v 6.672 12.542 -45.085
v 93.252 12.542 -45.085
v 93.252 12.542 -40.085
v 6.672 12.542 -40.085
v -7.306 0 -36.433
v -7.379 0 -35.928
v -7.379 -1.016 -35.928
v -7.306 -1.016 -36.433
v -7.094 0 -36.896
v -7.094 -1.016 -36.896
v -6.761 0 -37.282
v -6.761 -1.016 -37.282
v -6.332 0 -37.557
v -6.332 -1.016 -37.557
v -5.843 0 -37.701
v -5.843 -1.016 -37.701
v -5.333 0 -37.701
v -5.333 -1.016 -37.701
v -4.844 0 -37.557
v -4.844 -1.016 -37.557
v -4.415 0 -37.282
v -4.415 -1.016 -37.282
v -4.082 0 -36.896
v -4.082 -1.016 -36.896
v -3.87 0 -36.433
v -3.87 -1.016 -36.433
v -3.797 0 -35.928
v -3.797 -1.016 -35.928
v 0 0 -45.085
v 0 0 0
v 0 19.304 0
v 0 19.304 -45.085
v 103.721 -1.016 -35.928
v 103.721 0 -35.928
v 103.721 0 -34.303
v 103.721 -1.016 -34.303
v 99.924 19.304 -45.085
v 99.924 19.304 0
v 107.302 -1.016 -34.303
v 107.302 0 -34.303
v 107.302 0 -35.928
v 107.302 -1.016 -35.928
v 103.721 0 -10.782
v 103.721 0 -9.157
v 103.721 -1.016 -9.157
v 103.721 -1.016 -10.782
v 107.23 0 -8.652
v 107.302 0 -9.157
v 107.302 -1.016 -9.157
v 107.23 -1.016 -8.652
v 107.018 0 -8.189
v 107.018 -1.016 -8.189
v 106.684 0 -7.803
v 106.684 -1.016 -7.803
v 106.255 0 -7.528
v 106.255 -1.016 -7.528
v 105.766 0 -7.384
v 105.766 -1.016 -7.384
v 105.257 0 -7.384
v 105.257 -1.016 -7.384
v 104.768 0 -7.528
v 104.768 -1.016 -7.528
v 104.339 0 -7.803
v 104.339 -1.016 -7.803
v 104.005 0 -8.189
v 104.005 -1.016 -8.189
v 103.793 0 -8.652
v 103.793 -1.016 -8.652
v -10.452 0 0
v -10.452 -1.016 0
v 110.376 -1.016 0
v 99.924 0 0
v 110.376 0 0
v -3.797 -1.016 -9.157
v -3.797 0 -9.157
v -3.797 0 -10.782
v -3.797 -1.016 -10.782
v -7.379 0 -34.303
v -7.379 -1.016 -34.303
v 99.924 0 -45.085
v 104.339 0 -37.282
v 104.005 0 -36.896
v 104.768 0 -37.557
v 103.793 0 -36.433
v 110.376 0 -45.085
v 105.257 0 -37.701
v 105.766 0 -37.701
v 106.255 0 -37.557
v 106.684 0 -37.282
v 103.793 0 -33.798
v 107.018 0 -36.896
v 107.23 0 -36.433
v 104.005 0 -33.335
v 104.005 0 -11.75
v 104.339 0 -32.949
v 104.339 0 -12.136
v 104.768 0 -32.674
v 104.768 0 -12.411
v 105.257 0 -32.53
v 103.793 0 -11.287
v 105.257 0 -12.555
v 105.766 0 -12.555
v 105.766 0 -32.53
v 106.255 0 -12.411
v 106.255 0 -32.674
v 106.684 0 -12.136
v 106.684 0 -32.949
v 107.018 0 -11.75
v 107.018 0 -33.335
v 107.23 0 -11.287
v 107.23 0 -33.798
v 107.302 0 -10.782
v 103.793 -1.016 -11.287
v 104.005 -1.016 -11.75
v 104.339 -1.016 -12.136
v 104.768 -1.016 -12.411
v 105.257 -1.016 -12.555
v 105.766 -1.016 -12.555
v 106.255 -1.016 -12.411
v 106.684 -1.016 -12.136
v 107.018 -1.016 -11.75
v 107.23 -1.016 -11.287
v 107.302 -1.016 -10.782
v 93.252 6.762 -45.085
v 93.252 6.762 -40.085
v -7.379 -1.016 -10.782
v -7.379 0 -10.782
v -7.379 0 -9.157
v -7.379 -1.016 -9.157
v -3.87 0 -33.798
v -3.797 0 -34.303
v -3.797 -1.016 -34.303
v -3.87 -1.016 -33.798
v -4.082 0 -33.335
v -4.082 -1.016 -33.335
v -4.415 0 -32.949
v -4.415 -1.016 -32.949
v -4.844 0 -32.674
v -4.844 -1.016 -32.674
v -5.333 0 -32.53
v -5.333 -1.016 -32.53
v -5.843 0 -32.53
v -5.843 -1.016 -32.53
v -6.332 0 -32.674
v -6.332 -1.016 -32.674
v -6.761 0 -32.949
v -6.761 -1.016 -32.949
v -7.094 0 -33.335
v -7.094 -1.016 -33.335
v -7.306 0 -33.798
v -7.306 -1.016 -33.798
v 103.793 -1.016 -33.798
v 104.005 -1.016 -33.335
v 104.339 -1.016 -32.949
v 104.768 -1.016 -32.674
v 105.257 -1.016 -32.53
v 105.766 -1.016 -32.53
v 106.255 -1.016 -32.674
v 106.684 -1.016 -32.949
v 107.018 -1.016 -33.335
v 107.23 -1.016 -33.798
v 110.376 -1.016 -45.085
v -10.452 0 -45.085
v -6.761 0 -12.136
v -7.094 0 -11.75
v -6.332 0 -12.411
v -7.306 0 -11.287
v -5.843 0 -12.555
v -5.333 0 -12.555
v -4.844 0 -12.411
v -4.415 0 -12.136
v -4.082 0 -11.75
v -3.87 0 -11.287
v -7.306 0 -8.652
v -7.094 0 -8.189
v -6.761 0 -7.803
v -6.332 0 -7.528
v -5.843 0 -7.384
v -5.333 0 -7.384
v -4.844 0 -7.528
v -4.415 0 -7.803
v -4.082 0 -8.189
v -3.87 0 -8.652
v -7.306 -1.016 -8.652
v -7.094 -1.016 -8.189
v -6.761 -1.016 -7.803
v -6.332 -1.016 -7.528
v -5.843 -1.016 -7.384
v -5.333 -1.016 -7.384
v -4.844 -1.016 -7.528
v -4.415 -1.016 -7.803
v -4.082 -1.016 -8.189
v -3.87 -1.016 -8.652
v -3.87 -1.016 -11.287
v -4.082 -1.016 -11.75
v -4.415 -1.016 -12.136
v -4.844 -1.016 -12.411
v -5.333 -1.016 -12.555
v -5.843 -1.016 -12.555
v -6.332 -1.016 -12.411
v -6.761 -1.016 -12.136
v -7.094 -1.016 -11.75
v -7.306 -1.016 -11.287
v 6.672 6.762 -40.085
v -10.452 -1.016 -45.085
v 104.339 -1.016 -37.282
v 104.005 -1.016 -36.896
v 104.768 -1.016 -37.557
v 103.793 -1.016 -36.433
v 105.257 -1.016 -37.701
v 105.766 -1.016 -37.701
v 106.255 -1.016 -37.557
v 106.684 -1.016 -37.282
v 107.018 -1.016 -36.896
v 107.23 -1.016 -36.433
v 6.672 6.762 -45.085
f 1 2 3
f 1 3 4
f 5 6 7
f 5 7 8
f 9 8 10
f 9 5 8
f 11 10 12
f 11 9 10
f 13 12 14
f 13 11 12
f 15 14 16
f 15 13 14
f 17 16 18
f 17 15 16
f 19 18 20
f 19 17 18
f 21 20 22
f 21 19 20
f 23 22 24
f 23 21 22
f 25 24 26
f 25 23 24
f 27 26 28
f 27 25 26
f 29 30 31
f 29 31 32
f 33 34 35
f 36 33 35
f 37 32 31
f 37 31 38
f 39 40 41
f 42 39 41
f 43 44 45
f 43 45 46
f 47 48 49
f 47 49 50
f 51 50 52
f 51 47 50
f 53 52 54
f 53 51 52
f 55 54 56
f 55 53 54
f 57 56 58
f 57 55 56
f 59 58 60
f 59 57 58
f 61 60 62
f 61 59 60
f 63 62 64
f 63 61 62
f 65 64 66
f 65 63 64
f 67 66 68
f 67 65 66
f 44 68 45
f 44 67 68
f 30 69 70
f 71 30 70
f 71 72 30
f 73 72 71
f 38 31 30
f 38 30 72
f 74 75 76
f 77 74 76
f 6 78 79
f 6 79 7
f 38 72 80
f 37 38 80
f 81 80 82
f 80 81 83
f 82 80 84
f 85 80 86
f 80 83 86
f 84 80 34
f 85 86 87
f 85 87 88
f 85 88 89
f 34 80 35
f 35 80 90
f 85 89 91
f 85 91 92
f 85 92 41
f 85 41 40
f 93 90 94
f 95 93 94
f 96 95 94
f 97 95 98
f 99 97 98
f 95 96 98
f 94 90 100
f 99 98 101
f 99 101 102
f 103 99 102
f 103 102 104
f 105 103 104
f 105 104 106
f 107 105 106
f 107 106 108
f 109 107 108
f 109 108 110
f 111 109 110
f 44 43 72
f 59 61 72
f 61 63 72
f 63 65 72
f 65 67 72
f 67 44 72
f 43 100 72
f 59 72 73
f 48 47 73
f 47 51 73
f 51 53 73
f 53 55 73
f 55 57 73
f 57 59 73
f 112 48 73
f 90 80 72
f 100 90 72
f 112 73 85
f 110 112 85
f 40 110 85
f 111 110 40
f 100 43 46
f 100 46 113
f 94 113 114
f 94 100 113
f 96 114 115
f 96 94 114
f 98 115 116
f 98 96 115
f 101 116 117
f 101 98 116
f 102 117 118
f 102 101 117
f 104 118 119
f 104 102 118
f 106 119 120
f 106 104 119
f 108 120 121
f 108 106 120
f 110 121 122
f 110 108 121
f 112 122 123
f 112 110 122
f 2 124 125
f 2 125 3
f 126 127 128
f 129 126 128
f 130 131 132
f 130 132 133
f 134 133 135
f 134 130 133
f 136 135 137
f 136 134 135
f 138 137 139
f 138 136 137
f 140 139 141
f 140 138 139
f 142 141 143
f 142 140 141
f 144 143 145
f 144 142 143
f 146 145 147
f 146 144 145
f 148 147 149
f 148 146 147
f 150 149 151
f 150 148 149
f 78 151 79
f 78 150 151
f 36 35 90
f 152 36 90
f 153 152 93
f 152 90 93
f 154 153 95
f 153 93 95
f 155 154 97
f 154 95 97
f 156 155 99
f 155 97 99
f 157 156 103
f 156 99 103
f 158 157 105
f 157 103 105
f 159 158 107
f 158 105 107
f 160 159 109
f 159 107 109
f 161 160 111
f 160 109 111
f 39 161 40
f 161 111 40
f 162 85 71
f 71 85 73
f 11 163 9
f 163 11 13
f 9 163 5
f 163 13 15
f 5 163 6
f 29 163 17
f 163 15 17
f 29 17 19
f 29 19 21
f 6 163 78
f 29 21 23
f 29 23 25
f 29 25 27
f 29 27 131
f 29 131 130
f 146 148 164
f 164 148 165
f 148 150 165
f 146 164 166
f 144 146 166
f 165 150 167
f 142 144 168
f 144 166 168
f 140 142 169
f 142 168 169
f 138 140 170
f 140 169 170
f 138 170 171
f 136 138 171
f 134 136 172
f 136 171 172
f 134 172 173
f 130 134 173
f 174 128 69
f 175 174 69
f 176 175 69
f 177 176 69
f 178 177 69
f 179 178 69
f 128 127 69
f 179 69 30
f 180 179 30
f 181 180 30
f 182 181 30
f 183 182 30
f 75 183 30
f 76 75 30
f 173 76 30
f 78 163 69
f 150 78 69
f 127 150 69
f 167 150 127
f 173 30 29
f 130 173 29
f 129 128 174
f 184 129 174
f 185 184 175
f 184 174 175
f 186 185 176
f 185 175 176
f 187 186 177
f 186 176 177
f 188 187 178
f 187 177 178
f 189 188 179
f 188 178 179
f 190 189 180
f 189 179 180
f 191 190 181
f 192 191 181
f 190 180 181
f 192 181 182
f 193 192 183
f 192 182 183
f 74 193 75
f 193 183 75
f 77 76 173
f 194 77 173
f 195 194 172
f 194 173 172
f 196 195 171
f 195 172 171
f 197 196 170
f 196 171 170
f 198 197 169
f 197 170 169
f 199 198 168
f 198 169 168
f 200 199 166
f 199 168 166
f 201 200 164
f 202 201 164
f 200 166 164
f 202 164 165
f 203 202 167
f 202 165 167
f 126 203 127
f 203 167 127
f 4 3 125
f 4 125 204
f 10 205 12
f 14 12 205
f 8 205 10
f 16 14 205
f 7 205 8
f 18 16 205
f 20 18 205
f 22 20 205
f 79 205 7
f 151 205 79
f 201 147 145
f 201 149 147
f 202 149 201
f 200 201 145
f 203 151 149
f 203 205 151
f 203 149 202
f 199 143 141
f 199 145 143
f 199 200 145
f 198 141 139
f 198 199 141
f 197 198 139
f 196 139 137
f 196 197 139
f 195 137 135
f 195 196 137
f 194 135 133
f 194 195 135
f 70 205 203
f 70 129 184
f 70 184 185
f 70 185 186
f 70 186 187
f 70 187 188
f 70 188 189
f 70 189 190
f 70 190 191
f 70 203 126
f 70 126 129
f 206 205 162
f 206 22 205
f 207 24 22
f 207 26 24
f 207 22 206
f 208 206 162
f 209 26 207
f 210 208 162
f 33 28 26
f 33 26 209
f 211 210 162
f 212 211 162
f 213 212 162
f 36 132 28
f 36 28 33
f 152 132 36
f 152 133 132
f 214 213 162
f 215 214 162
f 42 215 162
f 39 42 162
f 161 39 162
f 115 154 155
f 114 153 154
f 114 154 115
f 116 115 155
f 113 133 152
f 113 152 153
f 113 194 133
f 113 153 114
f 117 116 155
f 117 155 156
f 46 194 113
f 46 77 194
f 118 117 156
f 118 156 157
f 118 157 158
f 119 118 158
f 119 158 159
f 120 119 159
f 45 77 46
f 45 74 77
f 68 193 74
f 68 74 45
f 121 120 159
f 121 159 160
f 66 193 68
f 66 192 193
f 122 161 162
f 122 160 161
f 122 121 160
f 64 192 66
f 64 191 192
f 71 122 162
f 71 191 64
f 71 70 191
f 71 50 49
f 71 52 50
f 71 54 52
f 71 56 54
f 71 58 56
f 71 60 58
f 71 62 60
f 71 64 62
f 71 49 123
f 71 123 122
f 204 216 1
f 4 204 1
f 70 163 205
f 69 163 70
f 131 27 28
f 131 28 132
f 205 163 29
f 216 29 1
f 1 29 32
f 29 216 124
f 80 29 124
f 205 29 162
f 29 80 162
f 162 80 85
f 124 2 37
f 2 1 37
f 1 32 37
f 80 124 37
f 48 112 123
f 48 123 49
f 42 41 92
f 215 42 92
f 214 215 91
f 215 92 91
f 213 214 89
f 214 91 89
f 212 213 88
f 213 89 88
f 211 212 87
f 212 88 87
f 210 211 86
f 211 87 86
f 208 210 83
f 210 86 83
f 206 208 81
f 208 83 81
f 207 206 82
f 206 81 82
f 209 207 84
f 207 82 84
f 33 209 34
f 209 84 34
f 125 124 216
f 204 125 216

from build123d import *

# Parameters (mm, degrees)
SKETCH1_W           = 99.9236
SKETCH1_H           = 45.085
BOSS_EXTRUDE1_DEPTH = 19.304
SKETCH2_W           = 120.8278
SKETCH2_H           = 45.085
BOSS_EXTRUDE2_DEPTH = 1.016
SKETCH3_W           = 86.580193544
SKETCH3_H           = 5.780372674
CUT_EXTRUDE1_DEPTH  = 5


with BuildPart() as part:
    # Sketch1 → Boss-Extrude1 (new body)
    with BuildSketch(Plane(origin=(0, 0, 0), x_dir=(1, 0, 0), z_dir=(0, 1, 0))):
        with Locations((49.9618, 22.5425)):
            Rectangle(SKETCH1_W, SKETCH1_H)
    extrude(amount=BOSS_EXTRUDE1_DEPTH)

    # Sketch2 → Boss-Extrude2 (add)
    with BuildSketch(Plane.XZ):
        with Locations((49.9618, -22.5425)):
            Rectangle(SKETCH2_W, SKETCH2_H)
        with BuildLine():
            Line((-3.7973, -9.1567), (-3.7973, -10.7823))
            ThreePointArc((-3.7973, -10.7823), (-5.588, -12.573), (-7.3787, -10.7823))
            Line((-7.3787, -10.7823), (-7.3787, -9.1567))
            ThreePointArc((-7.3787, -9.1567), (-5.588, -7.366), (-3.7973, -9.1567))
        make_face(mode=Mode.SUBTRACT)
        with BuildLine():
            Line((-3.7973, -35.9283), (-3.7973, -34.3027))
            ThreePointArc((-3.7973, -34.3027), (-5.588, -32.512), (-7.3787, -34.3027))
            Line((-7.3787, -34.3027), (-7.3787, -35.9283))
            ThreePointArc((-7.3787, -35.9283), (-5.588, -37.719), (-3.7973, -35.9283))
        make_face(mode=Mode.SUBTRACT)
        with BuildLine():
            Line((103.7209, -9.1567), (103.7209, -10.7823))
            ThreePointArc((103.7209, -10.7823), (105.5116, -12.573), (107.3023, -10.7823))
            Line((107.3023, -10.7823), (107.3023, -9.1567))
            ThreePointArc((107.3023, -9.1567), (105.5116, -7.366), (103.7209, -9.1567))
        make_face(mode=Mode.SUBTRACT)
        with BuildLine():
            Line((103.7209, -35.9283), (103.7209, -34.3027))
            ThreePointArc((103.7209, -34.3027), (105.5116, -32.512), (107.3023, -34.3027))
            Line((107.3023, -34.3027), (107.3023, -35.9283))
            ThreePointArc((107.3023, -35.9283), (105.5116, -37.719), (103.7209, -35.9283))
        make_face(mode=Mode.SUBTRACT)
    extrude(amount=BOSS_EXTRUDE2_DEPTH)

    # Sketch3 → Cut-Extrude1 (cut)
    with BuildSketch(Plane(origin=(0, 0, -45.085), x_dir=(-1, 0, 0), z_dir=(0, 0, -1))):
        with Locations((-49.9618, 9.652)):
            Rectangle(SKETCH3_W, SKETCH3_H)
    extrude(amount=-CUT_EXTRUDE1_DEPTH, mode=Mode.SUBTRACT)


solid = part.part
